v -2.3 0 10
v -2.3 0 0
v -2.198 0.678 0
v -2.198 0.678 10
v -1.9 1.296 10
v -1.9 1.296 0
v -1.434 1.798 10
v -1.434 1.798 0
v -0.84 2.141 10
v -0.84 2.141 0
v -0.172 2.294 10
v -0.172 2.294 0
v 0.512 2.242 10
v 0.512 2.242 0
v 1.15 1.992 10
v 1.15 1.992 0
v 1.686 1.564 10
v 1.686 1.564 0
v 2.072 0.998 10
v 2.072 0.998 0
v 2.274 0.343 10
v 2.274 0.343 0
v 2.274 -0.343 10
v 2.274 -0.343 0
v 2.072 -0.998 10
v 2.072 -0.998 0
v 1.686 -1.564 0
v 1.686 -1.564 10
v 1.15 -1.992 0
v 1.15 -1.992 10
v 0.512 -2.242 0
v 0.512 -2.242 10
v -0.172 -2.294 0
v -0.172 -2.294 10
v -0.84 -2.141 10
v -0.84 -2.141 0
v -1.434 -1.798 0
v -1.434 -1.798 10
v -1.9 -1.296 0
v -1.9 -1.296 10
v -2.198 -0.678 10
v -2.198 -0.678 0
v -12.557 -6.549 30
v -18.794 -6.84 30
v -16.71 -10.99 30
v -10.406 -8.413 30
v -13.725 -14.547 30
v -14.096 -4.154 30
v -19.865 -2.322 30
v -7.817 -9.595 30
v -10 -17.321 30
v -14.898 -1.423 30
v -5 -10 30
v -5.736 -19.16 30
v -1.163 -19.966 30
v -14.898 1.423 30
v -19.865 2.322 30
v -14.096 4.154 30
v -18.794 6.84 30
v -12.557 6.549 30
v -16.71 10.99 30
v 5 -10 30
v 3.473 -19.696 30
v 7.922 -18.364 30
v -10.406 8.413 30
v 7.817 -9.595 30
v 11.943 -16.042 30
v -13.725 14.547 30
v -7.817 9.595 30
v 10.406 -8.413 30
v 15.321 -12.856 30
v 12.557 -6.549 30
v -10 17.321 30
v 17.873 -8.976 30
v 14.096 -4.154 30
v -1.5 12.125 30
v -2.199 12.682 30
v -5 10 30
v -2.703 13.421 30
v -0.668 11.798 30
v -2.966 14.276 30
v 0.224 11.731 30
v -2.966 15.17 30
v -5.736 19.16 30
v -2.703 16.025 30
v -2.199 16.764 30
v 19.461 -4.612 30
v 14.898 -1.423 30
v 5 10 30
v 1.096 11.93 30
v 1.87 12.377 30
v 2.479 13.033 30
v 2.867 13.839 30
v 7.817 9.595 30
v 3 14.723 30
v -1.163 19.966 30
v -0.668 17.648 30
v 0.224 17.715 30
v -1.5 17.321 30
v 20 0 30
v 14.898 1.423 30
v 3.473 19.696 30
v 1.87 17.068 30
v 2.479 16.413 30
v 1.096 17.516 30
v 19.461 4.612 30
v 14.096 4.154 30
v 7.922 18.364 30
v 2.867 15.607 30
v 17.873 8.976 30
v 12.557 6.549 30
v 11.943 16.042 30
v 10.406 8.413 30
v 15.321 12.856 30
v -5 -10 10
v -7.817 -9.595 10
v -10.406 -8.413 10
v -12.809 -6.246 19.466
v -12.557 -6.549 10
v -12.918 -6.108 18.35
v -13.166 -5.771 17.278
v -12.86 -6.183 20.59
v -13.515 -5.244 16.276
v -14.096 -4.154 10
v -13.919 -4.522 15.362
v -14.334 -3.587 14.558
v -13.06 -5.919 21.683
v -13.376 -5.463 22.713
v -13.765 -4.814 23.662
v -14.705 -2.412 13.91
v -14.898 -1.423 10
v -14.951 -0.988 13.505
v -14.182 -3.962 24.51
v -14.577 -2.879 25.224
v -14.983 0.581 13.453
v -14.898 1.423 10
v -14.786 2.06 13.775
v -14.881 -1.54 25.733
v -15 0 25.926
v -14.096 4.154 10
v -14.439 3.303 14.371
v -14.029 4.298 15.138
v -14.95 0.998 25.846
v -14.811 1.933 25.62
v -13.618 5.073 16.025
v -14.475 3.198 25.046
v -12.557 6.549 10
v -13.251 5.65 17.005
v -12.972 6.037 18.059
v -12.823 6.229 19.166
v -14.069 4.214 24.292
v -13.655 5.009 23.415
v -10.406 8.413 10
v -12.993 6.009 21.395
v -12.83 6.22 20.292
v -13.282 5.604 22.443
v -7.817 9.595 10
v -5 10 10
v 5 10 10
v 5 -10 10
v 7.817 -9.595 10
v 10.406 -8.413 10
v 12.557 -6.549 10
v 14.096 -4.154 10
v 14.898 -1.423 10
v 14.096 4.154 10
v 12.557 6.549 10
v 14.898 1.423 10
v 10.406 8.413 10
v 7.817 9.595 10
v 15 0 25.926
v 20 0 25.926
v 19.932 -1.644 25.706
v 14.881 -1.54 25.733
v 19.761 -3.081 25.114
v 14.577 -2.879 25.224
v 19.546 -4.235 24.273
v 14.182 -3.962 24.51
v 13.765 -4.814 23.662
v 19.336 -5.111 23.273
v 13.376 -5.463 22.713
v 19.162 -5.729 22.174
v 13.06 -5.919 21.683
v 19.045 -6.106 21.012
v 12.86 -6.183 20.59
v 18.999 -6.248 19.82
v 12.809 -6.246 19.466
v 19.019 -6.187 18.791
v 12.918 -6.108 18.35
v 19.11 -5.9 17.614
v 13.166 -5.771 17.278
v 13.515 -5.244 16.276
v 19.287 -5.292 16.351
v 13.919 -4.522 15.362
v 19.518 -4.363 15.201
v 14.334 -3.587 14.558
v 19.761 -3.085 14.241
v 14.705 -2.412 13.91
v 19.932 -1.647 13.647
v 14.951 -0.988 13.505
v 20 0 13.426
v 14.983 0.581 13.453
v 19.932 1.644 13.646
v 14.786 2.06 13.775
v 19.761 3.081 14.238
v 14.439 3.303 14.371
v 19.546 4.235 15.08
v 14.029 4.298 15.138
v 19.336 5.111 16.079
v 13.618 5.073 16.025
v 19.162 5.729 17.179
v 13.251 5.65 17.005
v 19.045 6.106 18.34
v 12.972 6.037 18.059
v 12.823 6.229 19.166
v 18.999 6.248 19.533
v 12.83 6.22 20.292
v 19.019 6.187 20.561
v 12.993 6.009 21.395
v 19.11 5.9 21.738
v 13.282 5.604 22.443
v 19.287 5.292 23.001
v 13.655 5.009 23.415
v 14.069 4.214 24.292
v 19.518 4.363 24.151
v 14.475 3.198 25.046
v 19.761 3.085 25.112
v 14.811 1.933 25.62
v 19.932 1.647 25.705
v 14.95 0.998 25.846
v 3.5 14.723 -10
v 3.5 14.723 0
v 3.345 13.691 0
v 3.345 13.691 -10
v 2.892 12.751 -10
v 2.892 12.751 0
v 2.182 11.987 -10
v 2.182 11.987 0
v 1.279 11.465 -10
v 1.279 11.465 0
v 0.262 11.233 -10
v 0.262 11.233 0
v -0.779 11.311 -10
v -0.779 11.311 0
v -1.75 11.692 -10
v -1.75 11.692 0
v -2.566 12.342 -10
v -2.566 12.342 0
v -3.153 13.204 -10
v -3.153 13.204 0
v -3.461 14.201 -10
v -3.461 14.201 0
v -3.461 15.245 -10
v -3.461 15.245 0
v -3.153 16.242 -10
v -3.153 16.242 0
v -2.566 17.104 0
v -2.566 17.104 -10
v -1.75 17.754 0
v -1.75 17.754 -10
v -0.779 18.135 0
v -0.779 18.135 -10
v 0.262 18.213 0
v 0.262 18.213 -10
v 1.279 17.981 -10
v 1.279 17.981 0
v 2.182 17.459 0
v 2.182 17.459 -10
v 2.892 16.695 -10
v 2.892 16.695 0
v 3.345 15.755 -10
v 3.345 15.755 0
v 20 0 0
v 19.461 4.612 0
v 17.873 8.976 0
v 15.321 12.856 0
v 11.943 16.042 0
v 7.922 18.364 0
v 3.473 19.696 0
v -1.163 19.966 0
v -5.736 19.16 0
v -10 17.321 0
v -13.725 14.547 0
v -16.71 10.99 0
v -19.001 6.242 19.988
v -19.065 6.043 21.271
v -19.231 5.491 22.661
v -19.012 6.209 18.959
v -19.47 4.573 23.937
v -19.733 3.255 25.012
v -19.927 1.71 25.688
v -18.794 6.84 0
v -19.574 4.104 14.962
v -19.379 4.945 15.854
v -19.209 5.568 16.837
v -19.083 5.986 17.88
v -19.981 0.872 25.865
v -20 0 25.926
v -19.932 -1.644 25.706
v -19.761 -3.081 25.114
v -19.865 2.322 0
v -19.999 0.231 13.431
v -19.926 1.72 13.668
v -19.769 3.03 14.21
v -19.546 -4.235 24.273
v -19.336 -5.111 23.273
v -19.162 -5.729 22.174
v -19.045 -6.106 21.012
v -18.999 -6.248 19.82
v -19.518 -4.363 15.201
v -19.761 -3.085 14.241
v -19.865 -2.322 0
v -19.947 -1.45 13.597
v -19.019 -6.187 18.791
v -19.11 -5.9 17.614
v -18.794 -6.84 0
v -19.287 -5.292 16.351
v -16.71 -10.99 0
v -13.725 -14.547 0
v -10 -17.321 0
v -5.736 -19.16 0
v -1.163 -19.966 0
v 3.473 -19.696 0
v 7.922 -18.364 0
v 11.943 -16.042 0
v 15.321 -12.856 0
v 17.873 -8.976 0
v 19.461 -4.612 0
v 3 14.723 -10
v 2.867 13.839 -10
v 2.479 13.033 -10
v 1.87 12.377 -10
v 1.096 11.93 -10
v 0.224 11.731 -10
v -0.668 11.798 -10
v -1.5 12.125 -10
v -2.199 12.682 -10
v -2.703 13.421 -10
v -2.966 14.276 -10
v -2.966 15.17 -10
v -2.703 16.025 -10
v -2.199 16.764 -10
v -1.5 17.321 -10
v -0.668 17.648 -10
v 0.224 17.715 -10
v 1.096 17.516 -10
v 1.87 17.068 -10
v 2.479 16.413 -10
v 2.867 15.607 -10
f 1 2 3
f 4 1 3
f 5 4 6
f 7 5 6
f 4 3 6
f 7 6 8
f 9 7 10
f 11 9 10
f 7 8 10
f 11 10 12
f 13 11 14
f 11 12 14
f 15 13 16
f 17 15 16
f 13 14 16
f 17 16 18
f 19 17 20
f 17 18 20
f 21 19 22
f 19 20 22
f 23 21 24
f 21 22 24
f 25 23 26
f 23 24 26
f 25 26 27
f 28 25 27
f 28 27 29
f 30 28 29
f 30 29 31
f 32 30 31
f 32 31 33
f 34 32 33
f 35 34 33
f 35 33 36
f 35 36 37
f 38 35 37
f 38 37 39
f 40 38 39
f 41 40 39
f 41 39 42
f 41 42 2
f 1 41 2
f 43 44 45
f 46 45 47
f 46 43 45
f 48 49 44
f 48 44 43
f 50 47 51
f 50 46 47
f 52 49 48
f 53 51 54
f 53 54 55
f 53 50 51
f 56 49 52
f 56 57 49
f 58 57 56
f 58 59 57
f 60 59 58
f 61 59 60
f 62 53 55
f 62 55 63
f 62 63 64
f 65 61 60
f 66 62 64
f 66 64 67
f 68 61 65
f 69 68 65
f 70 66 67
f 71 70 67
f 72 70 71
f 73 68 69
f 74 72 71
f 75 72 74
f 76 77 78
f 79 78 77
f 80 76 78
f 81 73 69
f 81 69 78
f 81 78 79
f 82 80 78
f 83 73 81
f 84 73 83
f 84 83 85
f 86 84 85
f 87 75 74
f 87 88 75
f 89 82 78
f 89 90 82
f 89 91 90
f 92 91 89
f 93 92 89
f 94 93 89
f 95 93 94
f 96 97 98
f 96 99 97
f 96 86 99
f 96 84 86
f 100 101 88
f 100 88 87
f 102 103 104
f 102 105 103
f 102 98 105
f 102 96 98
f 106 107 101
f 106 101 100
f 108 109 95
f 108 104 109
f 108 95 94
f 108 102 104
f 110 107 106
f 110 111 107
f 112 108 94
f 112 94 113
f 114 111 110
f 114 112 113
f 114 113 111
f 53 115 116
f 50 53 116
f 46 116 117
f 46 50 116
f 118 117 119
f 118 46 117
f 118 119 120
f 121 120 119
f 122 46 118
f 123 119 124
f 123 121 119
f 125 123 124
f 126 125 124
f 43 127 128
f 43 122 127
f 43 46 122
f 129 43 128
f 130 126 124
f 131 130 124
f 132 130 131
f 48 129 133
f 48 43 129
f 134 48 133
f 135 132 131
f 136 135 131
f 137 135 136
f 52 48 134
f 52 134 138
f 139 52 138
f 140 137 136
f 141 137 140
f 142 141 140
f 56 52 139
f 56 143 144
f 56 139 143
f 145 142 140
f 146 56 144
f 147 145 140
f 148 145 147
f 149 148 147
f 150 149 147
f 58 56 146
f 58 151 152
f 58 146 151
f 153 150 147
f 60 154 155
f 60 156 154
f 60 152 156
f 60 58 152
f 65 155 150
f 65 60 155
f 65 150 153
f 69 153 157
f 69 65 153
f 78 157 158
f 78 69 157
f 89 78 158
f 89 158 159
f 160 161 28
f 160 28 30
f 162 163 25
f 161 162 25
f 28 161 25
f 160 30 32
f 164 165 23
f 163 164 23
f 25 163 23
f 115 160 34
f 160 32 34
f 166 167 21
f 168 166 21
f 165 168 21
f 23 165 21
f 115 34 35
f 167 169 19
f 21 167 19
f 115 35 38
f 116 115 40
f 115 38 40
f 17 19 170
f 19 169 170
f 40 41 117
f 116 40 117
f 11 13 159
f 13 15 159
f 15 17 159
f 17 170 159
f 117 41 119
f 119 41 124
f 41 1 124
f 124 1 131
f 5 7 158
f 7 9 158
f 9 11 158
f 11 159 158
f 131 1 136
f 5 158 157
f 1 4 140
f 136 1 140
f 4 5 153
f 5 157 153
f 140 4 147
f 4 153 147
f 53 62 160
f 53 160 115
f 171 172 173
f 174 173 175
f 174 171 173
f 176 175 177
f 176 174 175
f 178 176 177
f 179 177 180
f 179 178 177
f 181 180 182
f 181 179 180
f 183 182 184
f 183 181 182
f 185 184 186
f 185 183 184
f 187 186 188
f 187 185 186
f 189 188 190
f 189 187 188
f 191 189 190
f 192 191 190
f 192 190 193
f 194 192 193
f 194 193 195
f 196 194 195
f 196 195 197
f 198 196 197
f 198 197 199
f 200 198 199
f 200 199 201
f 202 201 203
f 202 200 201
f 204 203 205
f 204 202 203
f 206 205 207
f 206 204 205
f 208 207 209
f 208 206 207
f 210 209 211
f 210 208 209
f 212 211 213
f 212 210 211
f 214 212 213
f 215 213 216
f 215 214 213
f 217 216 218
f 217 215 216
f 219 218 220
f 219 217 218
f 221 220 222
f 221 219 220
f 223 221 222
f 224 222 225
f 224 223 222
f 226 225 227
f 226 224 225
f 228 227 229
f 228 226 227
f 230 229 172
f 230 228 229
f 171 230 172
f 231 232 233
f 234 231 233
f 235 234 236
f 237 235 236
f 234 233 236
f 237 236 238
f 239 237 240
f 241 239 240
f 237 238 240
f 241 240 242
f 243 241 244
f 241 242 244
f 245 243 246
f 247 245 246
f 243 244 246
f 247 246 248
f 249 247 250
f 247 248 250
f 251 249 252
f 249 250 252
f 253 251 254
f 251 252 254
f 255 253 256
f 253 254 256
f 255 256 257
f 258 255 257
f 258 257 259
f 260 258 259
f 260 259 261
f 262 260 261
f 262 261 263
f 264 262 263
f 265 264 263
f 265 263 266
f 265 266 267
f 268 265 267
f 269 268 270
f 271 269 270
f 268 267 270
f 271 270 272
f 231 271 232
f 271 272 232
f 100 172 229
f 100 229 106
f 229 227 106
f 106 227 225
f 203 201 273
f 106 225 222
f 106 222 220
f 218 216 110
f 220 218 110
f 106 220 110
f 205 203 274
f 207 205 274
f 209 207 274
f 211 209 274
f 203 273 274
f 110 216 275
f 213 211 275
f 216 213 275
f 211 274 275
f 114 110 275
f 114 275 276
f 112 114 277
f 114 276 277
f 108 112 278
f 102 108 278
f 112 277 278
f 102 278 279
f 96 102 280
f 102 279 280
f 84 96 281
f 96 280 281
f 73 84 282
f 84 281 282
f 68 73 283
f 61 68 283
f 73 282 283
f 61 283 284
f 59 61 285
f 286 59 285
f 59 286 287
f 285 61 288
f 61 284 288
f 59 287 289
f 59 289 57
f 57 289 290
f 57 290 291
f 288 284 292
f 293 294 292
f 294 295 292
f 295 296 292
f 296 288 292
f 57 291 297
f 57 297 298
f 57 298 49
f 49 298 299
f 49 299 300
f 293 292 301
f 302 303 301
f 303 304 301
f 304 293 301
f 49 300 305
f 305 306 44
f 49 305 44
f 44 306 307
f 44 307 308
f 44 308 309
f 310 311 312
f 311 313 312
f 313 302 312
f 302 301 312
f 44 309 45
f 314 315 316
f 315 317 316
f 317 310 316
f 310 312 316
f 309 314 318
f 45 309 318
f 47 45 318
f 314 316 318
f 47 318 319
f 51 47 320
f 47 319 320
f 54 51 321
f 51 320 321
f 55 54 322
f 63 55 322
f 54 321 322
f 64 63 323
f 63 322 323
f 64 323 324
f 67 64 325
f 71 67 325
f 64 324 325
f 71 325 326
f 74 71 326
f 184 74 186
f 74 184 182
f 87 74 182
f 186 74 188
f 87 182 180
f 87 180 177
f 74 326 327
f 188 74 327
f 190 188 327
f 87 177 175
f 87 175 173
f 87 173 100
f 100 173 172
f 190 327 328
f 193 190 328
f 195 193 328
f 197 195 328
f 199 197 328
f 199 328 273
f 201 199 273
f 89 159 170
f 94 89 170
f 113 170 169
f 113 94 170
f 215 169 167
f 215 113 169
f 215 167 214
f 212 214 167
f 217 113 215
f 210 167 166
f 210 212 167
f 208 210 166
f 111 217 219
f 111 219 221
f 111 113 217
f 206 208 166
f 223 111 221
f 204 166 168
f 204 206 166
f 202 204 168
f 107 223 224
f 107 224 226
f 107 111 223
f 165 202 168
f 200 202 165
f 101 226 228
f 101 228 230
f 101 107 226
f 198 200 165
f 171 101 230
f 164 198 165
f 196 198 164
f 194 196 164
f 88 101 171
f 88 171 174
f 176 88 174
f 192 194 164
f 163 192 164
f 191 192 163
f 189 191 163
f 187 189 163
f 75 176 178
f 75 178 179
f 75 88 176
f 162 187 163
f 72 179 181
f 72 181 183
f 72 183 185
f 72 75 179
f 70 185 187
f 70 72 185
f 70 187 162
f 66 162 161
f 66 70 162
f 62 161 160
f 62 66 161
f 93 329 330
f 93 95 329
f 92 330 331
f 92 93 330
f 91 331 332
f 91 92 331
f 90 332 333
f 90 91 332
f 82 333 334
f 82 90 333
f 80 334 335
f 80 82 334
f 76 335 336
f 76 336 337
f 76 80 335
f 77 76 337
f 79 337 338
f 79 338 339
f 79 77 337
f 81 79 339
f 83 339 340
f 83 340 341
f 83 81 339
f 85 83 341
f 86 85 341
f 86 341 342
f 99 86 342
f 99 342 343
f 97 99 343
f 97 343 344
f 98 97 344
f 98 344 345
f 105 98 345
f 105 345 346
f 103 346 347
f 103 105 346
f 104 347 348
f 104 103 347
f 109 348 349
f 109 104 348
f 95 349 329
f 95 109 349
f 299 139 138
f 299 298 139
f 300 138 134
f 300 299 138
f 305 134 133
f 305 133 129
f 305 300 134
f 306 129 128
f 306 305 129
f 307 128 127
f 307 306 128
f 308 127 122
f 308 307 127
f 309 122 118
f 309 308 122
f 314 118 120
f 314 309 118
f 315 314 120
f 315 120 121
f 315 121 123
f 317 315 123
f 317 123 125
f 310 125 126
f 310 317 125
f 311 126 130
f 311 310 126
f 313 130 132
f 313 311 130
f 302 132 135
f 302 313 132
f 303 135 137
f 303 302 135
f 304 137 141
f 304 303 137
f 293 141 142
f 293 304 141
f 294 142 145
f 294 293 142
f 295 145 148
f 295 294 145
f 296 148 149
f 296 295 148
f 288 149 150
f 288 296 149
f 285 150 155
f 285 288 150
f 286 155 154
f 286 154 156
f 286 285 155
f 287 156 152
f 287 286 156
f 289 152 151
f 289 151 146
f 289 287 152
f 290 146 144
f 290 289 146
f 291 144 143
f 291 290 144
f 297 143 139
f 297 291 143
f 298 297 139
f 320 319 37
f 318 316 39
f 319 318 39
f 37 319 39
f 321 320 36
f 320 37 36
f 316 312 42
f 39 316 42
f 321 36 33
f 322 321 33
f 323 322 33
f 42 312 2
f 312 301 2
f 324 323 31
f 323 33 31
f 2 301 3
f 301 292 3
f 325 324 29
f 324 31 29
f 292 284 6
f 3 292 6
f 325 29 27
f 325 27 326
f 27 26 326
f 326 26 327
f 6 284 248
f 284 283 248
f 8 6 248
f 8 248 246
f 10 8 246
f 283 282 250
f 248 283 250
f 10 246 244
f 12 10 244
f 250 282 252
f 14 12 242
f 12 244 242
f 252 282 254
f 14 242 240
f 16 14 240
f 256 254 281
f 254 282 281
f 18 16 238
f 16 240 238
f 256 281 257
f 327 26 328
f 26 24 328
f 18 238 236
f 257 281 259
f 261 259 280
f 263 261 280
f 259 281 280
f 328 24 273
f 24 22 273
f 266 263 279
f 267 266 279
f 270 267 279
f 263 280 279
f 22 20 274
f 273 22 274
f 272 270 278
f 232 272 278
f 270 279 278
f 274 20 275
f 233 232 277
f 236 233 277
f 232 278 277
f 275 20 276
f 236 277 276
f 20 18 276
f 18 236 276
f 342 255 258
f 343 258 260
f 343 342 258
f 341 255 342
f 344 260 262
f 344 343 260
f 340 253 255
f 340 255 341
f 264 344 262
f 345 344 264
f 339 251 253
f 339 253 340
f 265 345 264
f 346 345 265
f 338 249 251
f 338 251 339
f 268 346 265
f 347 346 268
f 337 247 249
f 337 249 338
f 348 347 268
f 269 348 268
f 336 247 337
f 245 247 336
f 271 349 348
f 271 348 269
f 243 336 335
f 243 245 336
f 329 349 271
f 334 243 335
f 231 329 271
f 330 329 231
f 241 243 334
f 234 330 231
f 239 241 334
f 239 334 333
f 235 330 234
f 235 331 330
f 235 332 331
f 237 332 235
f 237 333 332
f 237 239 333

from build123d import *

# Parameters (mm, degrees)
SKETCH1_R               = 20
BOSS_EXTRUDE1_DEPTH     = 30
CUT_EXTRUDE1_DEPTH      = 20
SKETCH3_R               = 3
CUT_EXTRUDE2_DEPTH      = 35
CUT_EXTRUDE3_DEPTH      = 28
CUT_EXTRUDE3_DEPTH_BACK = 31
SKETCH4_R               = 6.25
SKETCH5_R               = 2.3
CUT_EXTRUDE4_DEPTH      = 30
SKETCH9_R               = 3.5
BOSS_EXTRUDE4_DEPTH     = 10
CUT_EXTRUDE6_START      = -10
SKETCH11_R              = 3
CUT_EXTRUDE6_DEPTH      = 10


with BuildPart() as part:
    # Sketch1 → Boss-Extrude1 (new body)
    with BuildSketch(Plane.XY):
        Circle(SKETCH1_R)
    extrude(amount=BOSS_EXTRUDE1_DEPTH)

    # Sketch2 → Cut-Extrude1 (cut)
    with BuildSketch(Plane.XY.offset(30)):
        with BuildLine():
            Line((-5, 10), (5, 10))
            ThreePointArc((5, 10), (15, 0), (5, -10))
            Line((5, -10), (-5, -10))
            ThreePointArc((-5, -10), (-15, 0), (-5, 10))
        make_face()
    extrude(amount=-CUT_EXTRUDE1_DEPTH, mode=Mode.SUBTRACT)

    # Sketch3 → Cut-Extrude2 (cut)
    with BuildSketch(Plane.XY.offset(30)):
        with Locations((0, 14.722991755)):
            Circle(SKETCH3_R)
    extrude(amount=-CUT_EXTRUDE2_DEPTH, mode=Mode.SUBTRACT)

    # Sketch4 → Cut-Extrude3 (cut, two sides: drawn at the far end of the back side and taken through both)
    with BuildSketch(Plane(origin=(0, 0, 0), x_dir=(0, 0, -1), z_dir=(1, 0, 0)).offset(-CUT_EXTRUDE3_DEPTH_BACK)):
        with Locations(Location((-19.676237733, 0, 0), (0, 0, 180))):
            Circle(SKETCH4_R)
    extrude(amount=CUT_EXTRUDE3_DEPTH + CUT_EXTRUDE3_DEPTH_BACK, mode=Mode.SUBTRACT)

    # Sketch5 → Cut-Extrude4 (cut)
    with BuildSketch(Plane(origin=(0, 0, 0), x_dir=(-1, 0, 0), z_dir=(0, 0, -1))):
        Circle(SKETCH5_R)
    extrude(amount=-CUT_EXTRUDE4_DEPTH, mode=Mode.SUBTRACT)

    # Sketch9 → Boss-Extrude4 (add)
    with BuildSketch(Plane(origin=(0, 0, 0), x_dir=(-1, 0, 0), z_dir=(0, 0, -1))):
        with Locations(Location((0, 14.722991755, 0), (0, 0, 180))):
            Circle(SKETCH9_R)
    extrude(amount=BOSS_EXTRUDE4_DEPTH)

    # Sketch11 → Cut-Extrude6 (cut)
    with BuildSketch(Plane(origin=(0, 0, -10), x_dir=(-1, 0, 0), z_dir=(0, 0, -1)).offset(CUT_EXTRUDE6_START)):
        with Locations(Location((0, 14.722991755, 0), (0, 0, 180))):
            Circle(SKETCH11_R)
    extrude(amount=CUT_EXTRUDE6_DEPTH, mode=Mode.SUBTRACT)


solid = part.part
